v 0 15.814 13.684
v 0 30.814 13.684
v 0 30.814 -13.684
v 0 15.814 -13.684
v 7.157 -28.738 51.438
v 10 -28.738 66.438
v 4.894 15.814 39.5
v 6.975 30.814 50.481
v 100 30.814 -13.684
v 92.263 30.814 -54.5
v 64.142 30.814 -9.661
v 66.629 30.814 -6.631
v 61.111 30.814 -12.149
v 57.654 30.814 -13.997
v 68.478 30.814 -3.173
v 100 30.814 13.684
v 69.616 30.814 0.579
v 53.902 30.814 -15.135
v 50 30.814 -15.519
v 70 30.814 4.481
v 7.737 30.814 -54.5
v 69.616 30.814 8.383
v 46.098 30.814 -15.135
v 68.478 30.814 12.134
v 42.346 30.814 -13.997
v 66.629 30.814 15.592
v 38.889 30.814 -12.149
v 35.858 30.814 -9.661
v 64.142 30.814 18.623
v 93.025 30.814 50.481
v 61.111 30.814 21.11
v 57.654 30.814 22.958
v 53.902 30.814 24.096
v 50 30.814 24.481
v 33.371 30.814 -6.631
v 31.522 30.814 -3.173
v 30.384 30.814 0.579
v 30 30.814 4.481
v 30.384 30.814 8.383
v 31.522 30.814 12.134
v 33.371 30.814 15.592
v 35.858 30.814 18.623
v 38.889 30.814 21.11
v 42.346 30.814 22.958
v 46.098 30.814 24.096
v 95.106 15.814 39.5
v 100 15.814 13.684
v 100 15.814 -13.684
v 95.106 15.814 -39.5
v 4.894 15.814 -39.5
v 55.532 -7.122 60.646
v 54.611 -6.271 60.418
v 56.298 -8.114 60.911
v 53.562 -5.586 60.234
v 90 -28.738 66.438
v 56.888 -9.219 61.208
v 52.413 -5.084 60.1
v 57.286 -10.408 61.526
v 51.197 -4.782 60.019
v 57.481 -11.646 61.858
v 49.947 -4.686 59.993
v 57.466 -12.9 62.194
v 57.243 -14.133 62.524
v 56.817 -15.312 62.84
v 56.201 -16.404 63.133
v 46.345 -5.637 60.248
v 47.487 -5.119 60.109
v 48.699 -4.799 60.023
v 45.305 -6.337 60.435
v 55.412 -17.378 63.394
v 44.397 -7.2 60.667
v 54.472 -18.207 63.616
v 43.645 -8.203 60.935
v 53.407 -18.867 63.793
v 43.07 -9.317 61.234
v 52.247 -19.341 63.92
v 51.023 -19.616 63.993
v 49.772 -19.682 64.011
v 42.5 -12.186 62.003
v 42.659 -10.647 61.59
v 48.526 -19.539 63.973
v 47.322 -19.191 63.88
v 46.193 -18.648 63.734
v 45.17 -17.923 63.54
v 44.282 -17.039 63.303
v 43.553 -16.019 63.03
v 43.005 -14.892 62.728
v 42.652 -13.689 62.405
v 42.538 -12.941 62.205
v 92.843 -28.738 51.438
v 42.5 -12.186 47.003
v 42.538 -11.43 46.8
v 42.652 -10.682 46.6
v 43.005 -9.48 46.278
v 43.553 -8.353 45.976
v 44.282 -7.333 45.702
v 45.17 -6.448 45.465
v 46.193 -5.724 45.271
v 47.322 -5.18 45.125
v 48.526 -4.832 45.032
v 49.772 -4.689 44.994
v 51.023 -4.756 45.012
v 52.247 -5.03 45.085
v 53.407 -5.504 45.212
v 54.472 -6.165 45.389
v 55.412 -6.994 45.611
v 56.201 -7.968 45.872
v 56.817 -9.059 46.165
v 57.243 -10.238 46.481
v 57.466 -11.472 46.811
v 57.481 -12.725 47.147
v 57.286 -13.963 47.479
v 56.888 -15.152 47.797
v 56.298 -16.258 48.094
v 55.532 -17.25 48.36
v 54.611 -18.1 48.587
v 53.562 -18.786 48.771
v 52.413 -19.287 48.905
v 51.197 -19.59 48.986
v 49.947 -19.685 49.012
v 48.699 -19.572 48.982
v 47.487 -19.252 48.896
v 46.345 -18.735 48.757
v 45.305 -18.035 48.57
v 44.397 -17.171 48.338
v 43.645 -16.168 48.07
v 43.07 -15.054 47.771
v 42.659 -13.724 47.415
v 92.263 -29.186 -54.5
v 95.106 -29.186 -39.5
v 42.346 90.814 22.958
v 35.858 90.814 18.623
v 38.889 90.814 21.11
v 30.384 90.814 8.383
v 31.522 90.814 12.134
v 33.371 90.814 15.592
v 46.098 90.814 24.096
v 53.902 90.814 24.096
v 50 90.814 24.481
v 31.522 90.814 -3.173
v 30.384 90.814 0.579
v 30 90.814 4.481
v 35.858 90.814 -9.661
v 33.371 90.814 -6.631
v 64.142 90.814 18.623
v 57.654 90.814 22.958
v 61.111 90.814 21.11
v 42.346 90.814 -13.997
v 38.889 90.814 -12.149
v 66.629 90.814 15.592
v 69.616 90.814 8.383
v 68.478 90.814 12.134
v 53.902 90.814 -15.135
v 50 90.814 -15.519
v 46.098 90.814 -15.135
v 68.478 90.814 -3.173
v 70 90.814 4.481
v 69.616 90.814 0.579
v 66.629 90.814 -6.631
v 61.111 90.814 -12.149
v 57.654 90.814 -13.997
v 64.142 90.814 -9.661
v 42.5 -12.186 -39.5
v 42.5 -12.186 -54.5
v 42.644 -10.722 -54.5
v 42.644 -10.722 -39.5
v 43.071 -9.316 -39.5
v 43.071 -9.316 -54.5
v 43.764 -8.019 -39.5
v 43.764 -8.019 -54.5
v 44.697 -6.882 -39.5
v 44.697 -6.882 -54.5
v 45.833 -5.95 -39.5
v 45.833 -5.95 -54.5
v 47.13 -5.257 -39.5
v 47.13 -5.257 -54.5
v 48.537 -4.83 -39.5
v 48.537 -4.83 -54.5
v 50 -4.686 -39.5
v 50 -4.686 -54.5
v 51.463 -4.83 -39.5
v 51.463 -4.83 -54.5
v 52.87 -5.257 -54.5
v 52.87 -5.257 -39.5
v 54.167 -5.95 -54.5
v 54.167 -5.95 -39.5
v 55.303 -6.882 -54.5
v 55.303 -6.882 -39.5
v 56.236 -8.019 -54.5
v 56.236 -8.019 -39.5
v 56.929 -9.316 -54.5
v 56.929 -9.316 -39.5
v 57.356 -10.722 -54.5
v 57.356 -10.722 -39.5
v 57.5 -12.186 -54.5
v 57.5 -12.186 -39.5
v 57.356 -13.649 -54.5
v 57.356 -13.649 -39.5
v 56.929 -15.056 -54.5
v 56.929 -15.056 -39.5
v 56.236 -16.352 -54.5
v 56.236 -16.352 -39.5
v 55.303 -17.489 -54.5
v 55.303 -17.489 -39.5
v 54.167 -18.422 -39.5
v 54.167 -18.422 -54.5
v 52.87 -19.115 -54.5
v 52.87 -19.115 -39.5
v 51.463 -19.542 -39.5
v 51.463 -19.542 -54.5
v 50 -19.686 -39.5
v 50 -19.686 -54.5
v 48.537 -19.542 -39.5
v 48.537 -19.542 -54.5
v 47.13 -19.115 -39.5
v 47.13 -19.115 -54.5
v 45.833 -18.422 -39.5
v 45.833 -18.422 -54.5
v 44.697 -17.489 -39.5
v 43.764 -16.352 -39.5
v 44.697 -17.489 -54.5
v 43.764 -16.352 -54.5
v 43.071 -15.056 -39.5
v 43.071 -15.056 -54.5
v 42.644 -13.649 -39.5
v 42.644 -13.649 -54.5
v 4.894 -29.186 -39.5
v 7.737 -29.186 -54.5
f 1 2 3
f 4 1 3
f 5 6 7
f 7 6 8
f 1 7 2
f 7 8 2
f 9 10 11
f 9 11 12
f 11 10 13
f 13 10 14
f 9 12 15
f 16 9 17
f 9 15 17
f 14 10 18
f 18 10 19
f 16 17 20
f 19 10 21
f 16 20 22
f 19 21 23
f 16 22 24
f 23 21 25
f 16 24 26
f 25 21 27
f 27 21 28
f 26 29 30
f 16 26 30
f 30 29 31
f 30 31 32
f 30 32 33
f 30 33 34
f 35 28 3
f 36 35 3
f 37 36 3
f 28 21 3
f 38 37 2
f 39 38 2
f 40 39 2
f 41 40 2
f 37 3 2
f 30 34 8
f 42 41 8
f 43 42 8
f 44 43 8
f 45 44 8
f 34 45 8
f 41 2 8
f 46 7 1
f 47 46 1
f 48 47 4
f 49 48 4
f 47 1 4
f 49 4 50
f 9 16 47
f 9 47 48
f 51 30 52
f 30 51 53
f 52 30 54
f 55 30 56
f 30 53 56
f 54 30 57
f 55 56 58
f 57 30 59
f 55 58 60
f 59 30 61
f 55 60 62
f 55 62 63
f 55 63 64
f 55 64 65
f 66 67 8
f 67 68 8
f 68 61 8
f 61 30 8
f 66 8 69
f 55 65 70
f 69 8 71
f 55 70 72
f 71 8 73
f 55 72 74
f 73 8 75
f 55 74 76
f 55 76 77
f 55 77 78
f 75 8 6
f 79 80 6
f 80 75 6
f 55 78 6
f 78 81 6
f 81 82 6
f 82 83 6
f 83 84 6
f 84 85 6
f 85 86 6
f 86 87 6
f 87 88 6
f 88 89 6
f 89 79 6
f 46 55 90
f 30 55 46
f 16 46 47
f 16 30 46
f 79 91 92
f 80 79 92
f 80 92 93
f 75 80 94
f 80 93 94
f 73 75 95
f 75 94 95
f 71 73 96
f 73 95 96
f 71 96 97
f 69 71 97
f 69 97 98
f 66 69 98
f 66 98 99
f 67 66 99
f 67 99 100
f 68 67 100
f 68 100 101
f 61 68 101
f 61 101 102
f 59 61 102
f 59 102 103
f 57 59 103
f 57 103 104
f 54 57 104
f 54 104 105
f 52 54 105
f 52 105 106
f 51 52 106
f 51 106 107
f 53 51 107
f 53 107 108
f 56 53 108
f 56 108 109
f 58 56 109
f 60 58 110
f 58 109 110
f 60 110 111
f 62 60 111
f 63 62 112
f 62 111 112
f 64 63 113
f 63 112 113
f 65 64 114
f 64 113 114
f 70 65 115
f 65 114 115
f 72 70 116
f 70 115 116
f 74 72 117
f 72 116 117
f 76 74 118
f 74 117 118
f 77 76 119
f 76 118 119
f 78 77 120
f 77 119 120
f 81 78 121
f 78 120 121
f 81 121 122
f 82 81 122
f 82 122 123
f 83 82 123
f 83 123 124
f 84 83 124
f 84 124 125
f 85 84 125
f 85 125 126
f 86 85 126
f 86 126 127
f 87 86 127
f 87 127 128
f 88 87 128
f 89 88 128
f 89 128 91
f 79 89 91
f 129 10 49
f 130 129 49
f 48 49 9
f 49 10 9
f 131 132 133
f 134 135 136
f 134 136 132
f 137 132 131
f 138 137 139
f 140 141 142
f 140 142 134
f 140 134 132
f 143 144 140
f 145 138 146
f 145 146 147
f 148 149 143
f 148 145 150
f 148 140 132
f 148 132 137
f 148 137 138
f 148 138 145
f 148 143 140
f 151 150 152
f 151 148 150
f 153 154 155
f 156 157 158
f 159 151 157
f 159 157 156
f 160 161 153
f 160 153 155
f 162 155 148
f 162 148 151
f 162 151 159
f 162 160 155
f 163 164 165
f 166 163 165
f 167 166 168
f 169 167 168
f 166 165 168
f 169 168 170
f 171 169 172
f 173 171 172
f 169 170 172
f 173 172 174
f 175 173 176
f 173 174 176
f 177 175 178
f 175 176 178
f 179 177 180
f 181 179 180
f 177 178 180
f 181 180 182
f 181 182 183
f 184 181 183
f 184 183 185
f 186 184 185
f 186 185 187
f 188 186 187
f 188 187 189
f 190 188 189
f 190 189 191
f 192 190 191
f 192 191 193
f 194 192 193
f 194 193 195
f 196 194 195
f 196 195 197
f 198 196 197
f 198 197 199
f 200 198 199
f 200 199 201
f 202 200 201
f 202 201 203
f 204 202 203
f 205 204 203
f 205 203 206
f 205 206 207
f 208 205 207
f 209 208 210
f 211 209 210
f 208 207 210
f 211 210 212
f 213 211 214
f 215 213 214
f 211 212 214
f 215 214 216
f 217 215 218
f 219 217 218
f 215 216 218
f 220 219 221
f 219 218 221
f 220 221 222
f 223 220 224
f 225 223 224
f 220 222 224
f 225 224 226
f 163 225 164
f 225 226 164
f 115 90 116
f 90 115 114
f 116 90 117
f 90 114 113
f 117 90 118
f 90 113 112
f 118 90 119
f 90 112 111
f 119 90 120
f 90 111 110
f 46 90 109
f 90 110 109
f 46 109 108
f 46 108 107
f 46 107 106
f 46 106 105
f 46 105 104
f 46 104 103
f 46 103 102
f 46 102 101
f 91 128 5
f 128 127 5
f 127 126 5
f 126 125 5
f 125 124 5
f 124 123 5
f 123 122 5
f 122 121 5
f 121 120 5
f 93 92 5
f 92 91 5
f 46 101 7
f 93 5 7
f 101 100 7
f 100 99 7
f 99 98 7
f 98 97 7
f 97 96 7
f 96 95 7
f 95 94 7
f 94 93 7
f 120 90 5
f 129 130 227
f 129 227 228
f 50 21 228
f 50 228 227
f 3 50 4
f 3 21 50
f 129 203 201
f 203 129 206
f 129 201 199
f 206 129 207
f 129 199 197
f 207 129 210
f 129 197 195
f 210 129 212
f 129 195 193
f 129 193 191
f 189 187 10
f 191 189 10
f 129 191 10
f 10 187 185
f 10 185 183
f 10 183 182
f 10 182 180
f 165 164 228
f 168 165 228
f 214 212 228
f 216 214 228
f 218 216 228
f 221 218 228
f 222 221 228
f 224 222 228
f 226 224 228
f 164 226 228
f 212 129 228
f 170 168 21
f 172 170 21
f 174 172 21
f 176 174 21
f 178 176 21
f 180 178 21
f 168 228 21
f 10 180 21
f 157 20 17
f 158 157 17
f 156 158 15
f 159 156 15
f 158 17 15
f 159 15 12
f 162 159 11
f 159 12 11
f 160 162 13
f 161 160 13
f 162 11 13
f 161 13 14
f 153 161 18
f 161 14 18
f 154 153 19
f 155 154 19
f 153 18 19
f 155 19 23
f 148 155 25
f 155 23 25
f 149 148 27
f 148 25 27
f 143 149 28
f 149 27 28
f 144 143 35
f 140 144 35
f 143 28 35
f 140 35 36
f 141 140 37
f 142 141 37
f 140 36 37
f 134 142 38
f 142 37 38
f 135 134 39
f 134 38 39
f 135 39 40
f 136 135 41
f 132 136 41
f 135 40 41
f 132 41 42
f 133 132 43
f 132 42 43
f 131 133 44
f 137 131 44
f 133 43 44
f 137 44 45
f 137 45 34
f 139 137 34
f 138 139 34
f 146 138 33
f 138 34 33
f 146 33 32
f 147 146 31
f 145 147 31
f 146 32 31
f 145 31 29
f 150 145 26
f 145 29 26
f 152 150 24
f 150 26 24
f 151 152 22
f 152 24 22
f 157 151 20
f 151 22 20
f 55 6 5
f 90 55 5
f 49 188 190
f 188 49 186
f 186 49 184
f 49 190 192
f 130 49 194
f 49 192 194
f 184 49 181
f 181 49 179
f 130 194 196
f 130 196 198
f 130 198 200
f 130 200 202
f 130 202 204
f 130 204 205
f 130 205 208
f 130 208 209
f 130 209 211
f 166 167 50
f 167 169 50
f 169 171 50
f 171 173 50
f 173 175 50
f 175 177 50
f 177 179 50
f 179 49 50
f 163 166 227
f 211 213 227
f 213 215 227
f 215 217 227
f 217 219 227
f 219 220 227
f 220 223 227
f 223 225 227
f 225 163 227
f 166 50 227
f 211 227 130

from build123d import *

# Parameters (mm, degrees)
BOSS_EXTRUDE1_DEPTH = 100
SKETCH2_R           = 7.5
CUT_EXTRUDE1_DEPTH  = 120
CUT_EXTRUDE2_DEPTH  = 100
SKETCH4_R           = 20
BOSS_EXTRUDE2_DEPTH = 60


with BuildPart() as part:
    # Sketch1 → Boss-Extrude1 (new body)
    with BuildSketch(Plane(origin=(0, 0, 0), x_dir=(0, 0, -1), z_dir=(1, 0, 0))):
        Polygon((-51.437881439, -28.738448854), (-39.5, 15.81433121), (39.5, 15.81433121), (39.5, -29.18566879), (54.5, -29.18566879), (54.5, 30.81433121), (-50.480762114, 30.81433121), (-66.437881439, -28.738448854), align=None)
    extrude(amount=BOSS_EXTRUDE1_DEPTH)

    # Sketch2 → Cut-Extrude1 (cut)
    with BuildSketch(Plane(origin=(0, 0, -54.5), x_dir=(-1, 0, 0), z_dir=(0, 0, -1))):
        with Locations((-50, -12.18566879)):
            Circle(SKETCH2_R)
    extrude(amount=-CUT_EXTRUDE1_DEPTH, mode=Mode.SUBTRACT)

    # Sketch3 → Cut-Extrude2 (cut)
    with BuildSketch(Plane(origin=(0, 30.81433121, 0), x_dir=(1, 0, 0), z_dir=(0, 1, 0))):
        Polygon((10, -66.437881439), (0, -13.684030484), (-18.365032474, -13.684030484), (-18.365032474, -72.107787752), align=None)
        Polygon((-18.365032474, 72.107787752), (10, 66.437881439), (0, 13.684030484), (-18.365032474, 13.684030484), align=None)
        Polygon((90, 66.437881439), (100, 13.684030484), (118.365032474, 13.684030484), (118.365032474, 72.107787752), align=None)
        Polygon((118.365032474, -72.107787752), (90, -66.437881439), (100, -13.684030484), (118.365032474, -13.684030484), align=None)
    extrude(amount=-CUT_EXTRUDE2_DEPTH, mode=Mode.SUBTRACT)

    # Sketch4 → Boss-Extrude2 (add)
    with BuildSketch(Plane(origin=(0, 30.81433121, 0), x_dir=(1, 0, 0), z_dir=(0, 1, 0))):
        with Locations((50, -4.480762114)):
            Circle(SKETCH4_R)
    extrude(amount=BOSS_EXTRUDE2_DEPTH)


solid = part.part
